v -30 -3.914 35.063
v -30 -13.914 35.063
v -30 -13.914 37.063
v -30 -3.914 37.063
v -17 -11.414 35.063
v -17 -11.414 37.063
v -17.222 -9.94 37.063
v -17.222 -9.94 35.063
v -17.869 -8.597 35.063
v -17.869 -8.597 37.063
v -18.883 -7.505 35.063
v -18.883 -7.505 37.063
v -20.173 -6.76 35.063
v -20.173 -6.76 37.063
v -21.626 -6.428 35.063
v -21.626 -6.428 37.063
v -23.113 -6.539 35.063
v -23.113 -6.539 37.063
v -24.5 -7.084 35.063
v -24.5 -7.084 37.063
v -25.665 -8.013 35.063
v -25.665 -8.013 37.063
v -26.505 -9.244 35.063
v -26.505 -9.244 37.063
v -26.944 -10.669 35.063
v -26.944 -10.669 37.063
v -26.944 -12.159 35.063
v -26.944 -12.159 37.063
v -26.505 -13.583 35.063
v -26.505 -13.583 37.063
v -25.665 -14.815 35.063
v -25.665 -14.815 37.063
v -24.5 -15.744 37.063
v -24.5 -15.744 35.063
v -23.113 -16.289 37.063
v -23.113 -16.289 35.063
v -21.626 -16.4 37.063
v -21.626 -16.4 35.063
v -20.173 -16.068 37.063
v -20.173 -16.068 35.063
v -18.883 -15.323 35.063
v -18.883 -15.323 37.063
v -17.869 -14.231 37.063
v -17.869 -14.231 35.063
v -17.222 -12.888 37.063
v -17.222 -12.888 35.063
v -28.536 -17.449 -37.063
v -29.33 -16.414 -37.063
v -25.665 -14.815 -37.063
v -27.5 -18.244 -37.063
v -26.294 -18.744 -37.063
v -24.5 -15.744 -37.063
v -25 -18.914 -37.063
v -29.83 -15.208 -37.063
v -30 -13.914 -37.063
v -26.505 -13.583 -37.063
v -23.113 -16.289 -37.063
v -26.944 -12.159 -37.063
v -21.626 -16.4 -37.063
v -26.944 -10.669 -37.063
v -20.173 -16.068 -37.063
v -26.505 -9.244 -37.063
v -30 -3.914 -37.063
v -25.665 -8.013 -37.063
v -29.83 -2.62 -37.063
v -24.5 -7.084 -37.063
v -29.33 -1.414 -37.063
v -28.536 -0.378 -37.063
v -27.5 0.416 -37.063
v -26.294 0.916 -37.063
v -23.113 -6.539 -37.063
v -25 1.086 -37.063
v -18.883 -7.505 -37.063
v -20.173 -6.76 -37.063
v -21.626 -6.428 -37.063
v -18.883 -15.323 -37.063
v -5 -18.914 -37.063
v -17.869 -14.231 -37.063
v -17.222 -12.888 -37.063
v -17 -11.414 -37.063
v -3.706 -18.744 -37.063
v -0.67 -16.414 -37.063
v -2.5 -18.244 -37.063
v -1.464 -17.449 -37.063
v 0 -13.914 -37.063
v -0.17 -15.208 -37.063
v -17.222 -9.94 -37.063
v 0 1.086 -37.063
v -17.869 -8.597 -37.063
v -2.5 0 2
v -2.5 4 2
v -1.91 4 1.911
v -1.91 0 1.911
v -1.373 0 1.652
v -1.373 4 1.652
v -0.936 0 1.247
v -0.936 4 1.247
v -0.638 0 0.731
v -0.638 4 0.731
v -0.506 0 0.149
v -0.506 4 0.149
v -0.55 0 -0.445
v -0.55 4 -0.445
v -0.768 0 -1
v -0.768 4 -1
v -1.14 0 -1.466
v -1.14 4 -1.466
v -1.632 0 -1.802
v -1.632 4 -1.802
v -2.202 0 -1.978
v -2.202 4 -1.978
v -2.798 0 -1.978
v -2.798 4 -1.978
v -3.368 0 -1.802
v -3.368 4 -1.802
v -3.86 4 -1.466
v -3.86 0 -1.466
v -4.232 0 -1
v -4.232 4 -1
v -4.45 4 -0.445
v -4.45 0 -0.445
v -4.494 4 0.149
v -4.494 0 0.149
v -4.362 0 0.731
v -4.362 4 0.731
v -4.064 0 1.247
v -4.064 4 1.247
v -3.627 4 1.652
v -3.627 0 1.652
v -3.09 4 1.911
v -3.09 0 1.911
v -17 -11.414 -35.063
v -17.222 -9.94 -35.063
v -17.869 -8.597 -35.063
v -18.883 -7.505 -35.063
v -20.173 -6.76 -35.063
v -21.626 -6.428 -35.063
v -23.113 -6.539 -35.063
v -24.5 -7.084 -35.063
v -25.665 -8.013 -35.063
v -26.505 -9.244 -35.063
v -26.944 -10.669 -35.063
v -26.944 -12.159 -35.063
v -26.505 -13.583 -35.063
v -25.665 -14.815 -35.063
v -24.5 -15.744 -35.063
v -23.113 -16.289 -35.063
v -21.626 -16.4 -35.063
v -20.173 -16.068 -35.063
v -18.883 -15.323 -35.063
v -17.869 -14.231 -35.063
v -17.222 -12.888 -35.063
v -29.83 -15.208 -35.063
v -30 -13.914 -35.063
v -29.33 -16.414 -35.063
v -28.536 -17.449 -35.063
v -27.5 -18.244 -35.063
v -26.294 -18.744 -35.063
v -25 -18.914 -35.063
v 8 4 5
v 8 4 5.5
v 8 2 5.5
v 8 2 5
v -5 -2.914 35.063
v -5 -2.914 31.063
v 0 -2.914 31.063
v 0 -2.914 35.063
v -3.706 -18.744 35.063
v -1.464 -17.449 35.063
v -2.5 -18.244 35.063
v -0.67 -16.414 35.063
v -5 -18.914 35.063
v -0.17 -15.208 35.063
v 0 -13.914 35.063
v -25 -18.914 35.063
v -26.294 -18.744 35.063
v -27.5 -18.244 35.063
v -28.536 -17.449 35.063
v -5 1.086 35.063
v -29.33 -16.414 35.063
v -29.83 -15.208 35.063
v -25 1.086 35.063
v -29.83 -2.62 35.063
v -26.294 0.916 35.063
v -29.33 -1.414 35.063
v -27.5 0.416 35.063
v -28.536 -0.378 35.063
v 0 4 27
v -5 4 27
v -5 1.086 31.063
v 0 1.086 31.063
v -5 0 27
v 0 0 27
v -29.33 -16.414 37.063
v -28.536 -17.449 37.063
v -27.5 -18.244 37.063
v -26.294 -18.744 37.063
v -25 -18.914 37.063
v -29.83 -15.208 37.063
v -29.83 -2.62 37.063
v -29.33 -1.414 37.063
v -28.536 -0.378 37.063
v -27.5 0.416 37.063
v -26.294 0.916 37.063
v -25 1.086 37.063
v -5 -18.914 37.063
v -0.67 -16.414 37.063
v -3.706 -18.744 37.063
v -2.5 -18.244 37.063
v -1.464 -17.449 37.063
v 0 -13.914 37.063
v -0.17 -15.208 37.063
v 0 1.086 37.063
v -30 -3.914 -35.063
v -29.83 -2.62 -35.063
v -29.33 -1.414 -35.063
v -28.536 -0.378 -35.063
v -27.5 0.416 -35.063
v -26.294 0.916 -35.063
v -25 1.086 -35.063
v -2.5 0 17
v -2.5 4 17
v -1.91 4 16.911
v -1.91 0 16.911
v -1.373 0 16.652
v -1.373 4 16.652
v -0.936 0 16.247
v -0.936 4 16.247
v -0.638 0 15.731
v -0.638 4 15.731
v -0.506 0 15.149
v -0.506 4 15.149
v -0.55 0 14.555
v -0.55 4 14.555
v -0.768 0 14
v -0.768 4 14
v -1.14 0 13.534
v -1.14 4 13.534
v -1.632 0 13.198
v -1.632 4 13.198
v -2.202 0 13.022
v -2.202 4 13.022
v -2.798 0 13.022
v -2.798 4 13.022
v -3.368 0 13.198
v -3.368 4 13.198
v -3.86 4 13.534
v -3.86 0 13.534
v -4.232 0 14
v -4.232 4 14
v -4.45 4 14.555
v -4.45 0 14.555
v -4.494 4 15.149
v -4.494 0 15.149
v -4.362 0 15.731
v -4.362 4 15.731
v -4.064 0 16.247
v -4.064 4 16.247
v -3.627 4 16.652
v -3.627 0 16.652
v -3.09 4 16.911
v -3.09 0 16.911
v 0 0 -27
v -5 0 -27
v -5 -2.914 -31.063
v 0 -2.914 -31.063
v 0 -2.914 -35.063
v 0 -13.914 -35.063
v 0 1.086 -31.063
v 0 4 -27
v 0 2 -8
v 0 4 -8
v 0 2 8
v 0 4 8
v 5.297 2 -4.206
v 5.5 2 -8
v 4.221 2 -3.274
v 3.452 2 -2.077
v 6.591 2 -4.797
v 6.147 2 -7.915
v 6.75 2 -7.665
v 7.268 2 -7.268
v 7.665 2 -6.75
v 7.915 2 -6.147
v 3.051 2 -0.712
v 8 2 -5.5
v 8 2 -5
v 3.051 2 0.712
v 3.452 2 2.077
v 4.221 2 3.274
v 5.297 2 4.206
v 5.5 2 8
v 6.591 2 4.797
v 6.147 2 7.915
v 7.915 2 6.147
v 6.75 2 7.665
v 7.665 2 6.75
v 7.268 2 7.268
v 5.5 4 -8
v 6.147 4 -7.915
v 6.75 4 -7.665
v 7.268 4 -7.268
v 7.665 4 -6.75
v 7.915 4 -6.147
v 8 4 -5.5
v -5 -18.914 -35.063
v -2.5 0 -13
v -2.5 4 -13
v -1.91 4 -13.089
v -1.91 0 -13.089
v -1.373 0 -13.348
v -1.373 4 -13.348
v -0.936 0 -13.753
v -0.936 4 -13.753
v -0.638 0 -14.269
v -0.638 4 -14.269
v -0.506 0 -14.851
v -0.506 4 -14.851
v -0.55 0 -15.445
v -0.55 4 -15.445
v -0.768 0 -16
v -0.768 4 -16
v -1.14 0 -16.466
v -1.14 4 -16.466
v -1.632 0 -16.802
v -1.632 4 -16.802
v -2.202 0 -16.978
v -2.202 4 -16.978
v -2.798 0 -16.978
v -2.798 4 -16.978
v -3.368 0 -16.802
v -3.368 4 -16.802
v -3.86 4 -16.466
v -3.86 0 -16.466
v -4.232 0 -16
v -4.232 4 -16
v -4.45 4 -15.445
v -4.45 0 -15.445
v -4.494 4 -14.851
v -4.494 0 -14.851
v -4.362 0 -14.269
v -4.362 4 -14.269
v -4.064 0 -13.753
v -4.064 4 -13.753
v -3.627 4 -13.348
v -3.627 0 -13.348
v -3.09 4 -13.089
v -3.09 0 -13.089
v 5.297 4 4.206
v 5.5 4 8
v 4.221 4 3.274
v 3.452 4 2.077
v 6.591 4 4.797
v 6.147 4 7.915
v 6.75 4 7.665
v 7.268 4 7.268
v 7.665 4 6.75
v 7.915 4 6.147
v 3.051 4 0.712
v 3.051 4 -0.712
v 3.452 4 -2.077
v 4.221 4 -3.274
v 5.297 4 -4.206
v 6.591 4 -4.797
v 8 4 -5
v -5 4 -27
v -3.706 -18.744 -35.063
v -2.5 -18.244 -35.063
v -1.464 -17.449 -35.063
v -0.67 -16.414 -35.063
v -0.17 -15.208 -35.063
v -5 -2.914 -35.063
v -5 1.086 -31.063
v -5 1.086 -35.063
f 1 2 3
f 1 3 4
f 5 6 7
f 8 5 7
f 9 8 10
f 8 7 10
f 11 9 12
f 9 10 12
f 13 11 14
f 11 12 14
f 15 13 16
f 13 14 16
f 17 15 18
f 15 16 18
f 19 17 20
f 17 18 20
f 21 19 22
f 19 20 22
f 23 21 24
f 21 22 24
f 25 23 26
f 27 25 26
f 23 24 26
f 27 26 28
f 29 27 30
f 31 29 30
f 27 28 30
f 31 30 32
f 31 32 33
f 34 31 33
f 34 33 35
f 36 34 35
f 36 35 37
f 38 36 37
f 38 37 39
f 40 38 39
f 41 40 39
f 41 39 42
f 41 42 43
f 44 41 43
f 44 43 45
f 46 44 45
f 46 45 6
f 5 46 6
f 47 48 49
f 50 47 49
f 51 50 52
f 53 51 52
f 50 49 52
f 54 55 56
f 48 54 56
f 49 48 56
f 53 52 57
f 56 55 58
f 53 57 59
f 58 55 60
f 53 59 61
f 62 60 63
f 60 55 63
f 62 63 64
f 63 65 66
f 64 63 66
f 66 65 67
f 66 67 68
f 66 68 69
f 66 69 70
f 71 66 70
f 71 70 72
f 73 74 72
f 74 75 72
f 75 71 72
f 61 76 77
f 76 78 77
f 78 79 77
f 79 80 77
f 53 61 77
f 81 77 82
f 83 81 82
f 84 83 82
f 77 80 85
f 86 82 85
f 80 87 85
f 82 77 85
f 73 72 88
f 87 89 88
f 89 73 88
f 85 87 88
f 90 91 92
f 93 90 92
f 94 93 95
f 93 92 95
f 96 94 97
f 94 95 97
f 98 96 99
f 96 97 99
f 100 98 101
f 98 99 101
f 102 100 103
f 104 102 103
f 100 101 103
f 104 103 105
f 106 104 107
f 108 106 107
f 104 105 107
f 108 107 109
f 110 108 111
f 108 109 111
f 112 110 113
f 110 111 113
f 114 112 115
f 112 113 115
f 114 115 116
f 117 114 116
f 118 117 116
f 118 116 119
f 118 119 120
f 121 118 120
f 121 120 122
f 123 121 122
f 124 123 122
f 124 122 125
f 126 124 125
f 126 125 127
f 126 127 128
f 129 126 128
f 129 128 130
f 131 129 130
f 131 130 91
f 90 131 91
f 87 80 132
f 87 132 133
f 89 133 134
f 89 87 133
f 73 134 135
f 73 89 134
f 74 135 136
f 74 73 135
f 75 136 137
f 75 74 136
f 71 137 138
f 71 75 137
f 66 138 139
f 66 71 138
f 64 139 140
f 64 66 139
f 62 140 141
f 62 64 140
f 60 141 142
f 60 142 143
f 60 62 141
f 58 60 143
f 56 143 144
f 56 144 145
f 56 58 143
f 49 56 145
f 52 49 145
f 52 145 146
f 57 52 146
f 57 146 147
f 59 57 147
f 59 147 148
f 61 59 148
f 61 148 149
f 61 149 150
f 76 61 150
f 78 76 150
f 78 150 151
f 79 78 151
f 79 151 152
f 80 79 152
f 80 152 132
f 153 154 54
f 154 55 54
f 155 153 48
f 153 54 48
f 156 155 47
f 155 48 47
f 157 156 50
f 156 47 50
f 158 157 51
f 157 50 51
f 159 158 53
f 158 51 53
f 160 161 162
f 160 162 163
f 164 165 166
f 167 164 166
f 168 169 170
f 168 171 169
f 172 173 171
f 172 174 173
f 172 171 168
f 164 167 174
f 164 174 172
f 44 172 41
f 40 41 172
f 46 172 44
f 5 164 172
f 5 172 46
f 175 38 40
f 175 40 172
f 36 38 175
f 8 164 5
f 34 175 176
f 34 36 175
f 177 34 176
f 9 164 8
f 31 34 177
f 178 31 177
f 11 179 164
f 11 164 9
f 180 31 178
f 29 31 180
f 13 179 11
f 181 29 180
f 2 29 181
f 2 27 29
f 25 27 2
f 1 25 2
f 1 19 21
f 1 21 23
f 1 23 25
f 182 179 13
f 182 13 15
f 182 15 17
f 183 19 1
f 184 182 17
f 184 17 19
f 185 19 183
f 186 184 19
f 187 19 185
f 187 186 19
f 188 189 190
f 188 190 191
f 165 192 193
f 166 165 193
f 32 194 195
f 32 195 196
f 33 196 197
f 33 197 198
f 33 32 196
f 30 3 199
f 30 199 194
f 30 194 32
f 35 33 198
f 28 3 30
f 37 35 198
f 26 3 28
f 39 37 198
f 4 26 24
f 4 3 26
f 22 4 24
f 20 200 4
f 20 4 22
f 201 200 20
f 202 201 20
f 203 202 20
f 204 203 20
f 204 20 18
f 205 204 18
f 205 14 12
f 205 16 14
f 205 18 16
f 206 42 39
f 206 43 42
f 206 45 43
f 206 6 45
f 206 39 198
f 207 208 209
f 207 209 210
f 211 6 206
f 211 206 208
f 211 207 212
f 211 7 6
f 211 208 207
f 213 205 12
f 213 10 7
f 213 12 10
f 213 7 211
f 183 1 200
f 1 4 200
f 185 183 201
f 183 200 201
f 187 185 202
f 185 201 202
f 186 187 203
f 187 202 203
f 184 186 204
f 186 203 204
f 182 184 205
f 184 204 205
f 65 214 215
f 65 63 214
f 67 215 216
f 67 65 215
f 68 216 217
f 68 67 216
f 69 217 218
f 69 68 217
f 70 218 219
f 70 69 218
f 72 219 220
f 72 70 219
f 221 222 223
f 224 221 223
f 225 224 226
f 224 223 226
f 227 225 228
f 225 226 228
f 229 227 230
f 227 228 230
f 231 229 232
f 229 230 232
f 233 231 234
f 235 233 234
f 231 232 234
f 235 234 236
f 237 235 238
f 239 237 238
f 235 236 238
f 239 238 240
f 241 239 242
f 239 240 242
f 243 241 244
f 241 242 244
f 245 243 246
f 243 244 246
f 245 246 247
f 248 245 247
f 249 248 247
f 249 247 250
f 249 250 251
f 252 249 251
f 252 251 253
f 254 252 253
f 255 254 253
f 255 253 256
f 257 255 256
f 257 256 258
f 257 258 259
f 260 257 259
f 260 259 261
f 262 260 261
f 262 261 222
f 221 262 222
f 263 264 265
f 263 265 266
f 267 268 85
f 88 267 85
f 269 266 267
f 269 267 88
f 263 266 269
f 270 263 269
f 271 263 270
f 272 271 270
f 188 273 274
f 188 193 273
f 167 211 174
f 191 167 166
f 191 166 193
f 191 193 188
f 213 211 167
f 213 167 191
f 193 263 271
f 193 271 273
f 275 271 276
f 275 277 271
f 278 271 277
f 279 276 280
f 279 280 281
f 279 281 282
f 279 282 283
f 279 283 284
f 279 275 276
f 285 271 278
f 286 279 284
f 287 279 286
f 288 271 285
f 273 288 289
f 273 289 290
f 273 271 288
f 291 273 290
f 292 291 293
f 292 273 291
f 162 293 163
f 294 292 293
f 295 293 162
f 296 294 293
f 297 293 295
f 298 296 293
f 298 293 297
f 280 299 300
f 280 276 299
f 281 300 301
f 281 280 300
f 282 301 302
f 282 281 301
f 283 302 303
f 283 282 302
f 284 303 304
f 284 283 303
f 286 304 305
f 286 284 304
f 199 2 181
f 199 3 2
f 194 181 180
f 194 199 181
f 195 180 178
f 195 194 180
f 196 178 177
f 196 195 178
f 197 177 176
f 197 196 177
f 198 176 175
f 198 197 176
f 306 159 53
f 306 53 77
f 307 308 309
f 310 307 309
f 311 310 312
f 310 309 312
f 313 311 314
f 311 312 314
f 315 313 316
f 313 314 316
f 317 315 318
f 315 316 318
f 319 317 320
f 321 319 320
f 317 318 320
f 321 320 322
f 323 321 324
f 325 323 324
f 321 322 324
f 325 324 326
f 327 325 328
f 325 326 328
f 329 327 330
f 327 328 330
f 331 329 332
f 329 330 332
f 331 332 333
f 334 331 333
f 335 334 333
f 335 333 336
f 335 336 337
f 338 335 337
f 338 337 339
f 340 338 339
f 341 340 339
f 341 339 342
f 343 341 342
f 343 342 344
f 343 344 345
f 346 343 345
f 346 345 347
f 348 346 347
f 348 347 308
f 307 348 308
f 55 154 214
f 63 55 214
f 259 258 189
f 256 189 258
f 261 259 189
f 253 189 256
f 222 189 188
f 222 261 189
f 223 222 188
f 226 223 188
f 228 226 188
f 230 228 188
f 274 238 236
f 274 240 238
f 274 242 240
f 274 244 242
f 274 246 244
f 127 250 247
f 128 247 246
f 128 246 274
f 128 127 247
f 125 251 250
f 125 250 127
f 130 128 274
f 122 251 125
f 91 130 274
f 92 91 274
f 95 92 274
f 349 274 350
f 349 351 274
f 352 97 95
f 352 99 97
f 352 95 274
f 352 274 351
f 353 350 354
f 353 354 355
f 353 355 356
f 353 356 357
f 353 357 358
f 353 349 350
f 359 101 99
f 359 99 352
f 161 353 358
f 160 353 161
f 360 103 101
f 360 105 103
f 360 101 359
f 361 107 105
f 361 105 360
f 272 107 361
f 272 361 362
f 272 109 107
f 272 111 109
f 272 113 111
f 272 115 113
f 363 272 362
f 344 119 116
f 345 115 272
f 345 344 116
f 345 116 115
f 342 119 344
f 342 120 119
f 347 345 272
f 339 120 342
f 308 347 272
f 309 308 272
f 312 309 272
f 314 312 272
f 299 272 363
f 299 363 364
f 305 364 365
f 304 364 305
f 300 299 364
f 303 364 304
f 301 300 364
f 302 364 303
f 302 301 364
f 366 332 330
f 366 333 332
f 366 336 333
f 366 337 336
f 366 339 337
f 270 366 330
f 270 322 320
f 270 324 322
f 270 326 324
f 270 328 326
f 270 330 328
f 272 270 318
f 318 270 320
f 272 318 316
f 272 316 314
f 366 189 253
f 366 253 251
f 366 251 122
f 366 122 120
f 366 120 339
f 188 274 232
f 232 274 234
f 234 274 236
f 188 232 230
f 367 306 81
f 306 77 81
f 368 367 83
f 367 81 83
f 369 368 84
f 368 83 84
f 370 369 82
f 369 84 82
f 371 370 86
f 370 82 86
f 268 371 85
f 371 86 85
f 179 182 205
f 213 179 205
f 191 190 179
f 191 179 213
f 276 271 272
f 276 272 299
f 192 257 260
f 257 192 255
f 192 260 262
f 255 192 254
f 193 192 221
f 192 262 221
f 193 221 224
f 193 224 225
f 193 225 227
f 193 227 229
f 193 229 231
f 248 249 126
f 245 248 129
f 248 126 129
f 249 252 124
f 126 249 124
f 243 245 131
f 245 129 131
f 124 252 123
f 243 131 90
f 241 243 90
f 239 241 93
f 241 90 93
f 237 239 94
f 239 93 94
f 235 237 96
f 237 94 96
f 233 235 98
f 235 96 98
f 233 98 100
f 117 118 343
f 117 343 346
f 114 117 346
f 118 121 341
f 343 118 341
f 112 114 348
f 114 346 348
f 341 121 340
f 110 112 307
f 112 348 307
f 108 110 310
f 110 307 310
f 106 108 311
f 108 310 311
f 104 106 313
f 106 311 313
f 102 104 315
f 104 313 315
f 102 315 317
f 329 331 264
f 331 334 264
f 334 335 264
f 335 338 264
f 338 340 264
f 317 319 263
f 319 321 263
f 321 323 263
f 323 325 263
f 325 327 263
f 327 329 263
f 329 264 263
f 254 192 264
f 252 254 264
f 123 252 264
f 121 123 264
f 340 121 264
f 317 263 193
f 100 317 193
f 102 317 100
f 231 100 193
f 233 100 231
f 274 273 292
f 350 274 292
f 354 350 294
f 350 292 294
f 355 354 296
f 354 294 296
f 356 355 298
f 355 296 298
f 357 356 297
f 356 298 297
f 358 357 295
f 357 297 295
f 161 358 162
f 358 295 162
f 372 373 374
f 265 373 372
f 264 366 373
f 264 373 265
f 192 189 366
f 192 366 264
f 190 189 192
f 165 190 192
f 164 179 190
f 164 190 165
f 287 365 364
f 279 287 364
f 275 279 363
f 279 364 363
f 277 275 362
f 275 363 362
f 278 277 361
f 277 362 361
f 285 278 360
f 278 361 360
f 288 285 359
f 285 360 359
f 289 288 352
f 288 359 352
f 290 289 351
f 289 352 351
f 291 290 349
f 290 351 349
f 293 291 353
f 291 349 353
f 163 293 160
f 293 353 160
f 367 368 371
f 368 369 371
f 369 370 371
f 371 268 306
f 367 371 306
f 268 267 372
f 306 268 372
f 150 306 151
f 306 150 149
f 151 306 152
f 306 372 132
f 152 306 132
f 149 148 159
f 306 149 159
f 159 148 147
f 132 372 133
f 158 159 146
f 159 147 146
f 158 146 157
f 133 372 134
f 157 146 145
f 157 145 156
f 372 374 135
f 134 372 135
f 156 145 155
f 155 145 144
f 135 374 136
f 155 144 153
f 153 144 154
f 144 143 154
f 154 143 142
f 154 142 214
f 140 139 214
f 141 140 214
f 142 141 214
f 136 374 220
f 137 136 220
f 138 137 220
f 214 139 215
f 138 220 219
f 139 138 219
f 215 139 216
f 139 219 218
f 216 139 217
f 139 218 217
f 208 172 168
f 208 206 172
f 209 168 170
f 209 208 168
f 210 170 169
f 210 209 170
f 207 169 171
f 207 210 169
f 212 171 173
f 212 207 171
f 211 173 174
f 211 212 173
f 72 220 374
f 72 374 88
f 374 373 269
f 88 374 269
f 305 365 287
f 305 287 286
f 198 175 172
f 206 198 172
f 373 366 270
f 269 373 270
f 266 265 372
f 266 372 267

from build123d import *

# Parameters (mm, degrees)
SKETCH1_W            = 5
SKETCH1_H            = 54
BOSS_EXTRUDE1_DEPTH  = 4
SKETCH3_W            = 16
SKETCH3_H            = 16
BOSS_EXTRUDE2_DEPTH  = 4
SKETCH6_W            = 5
SKETCH6_H            = 4
BOSS_EXTRUDE5_DEPTH  = 5
SKETCH10_W           = 30
SKETCH10_H           = 20
BOSS_EXTRUDE9_DEPTH  = 6
CUT_EXTRUDE2_REACH   = 54.903
SKETCH7_R            = 2
CUT_EXTRUDE3_REACH   = 54.903
SKETCH4_R            = 5
SKETCH12_W           = 16
SKETCH12_H           = 16
CUT_EXTRUDE4_DEPTH   = 2
CUT_EXTRUDE5_DEPTH   = 4
CUT_EXTRUDE6_REACH   = 78.804
SKETCH14_R           = 5
FILLET1_R            = 5
FILLET1_OF_MIRROR2_R = 5
CUT_EXTRUDE7_REACH   = 54.903
FILLET2_R            = 2.5


with BuildPart() as part:
    # Sketch1 → Boss-Extrude1 (new body)
    with BuildSketch(Plane(origin=(0, 0, 0), x_dir=(1, 0, 0), z_dir=(0, 1, 0))):
        with Locations((-2.5, 0)):
            Rectangle(SKETCH1_W, SKETCH1_H)
    extrude(amount=BOSS_EXTRUDE1_DEPTH)

    # Sketch3 → Boss-Extrude2 (add)
    with BuildSketch(Plane(origin=(0, 0, 0), x_dir=(1, 0, 0), z_dir=(0, 1, 0))):
        with Locations((8, 0)):
            Rectangle(SKETCH3_W, SKETCH3_H)
    extrude(amount=BOSS_EXTRUDE2_DEPTH)

    # Sketch6 → Boss-Extrude5 (add, along a direction that is not the sketch's normal)
    with BuildSketch(Plane.XY.offset(27)):
        with Locations((-2.5, 2)):
            Rectangle(SKETCH6_W, SKETCH6_H)
    boss_extrude5 = extrude(amount=BOSS_EXTRUDE5_DEPTH, dir=(0, -0.5827823156195225, 0.8126283114691164))

    # Mirror1: Boss-Extrude5 across plane
    add(boss_extrude5.mirror(Plane.XY))

    # Sketch10 → Boss-Extrude9 (add)
    with BuildSketch(Plane.XY.offset(31.063141557)):
        with Locations((-15, -8.913911578)):
            Rectangle(SKETCH10_W, SKETCH10_H)
    boss_extrude9 = extrude(amount=BOSS_EXTRUDE9_DEPTH)

    # Sketch7 → Cut-Extrude2 (cut, up to next)
    with BuildSketch(Plane(origin=(0, 4, 0), x_dir=(1, 0, 0), z_dir=(0, 1, 0)), mode=Mode.PRIVATE) as cut_extrude2_sk1:
        with Locations(Location((-2.5, 0, 0), (0, 0, 270))):
            Circle(SKETCH7_R)
    cut_extrude2_tool1 = extrude(cut_extrude2_sk1.sketch, amount=-CUT_EXTRUDE2_REACH, mode=Mode.PRIVATE) & part.part
    # Sketch7 → Cut-Extrude2 (cut, up to next)
    with BuildSketch(Plane(origin=(0, 4, 0), x_dir=(1, 0, 0), z_dir=(0, 1, 0)), mode=Mode.PRIVATE) as cut_extrude2_sk2:
        with Locations(Location((-2.5, 15, 0), (0, 0, 270))):
            Circle(SKETCH7_R)
    cut_extrude2_tool2 = extrude(cut_extrude2_sk2.sketch, amount=-CUT_EXTRUDE2_REACH, mode=Mode.PRIVATE) & part.part
    # Sketch7 → Cut-Extrude2 (cut, up to next)
    with BuildSketch(Plane(origin=(0, 4, 0), x_dir=(1, 0, 0), z_dir=(0, 1, 0)), mode=Mode.PRIVATE) as cut_extrude2_sk3:
        with Locations(Location((-2.5, -15, 0), (0, 0, 270))):
            Circle(SKETCH7_R)
    cut_extrude2_tool3 = extrude(cut_extrude2_sk3.sketch, amount=-CUT_EXTRUDE2_REACH, mode=Mode.PRIVATE) & part.part
    add(cut_extrude2_tool1.solids().sort_by_distance((-2.5, 4, 0))[0], mode=Mode.SUBTRACT)
    add(cut_extrude2_tool2.solids().sort_by_distance((-2.5, 4, -15))[0], mode=Mode.SUBTRACT)
    add(cut_extrude2_tool3.solids().sort_by_distance((-2.5, 4, 15))[0], mode=Mode.SUBTRACT)

    # Sketch4 → Cut-Extrude3 (cut, up to next)
    with BuildSketch(Plane(origin=(0, 4, 0), x_dir=(1, 0, 0), z_dir=(0, 1, 0)), mode=Mode.PRIVATE) as cut_extrude3_sk1:
        with Locations(Location((8, 0, 0), (0, 0, 270))):
            Circle(SKETCH4_R)
    cut_extrude3_tool1 = extrude(cut_extrude3_sk1.sketch, amount=-CUT_EXTRUDE3_REACH, mode=Mode.PRIVATE) & part.part
    add(cut_extrude3_tool1.solids().sort_by_distance((8, 4, 0))[0], mode=Mode.SUBTRACT)

    # Sketch12 → Cut-Extrude4 (cut)
    with BuildSketch(Plane.XZ):
        with Locations((8, 0)):
            Rectangle(SKETCH12_W, SKETCH12_H)
    extrude(amount=-CUT_EXTRUDE4_DEPTH, mode=Mode.SUBTRACT)

    # Sketch13 → Cut-Extrude5 (cut)
    with BuildSketch(Plane(origin=(0, 0, 31.063141557), x_dir=(-1, 0, 0), z_dir=(0, 0, -1))):
        Polygon((30, 1.086088422), (5, 1.086088422), (5, -2.913911578), (0, -2.913911578), (0, -18.913911578), (30, -18.913911578), align=None)
    cut_extrude5 = extrude(amount=-CUT_EXTRUDE5_DEPTH, mode=Mode.SUBTRACT)

    # Sketch14 → Cut-Extrude6 (cut, up to next)
    with BuildSketch(Plane.XY.offset(37.063141557), mode=Mode.PRIVATE) as cut_extrude6_sk1:
        with Locations((-22, -11.413911578)):
            Circle(SKETCH14_R)
    cut_extrude6_tool1 = extrude(cut_extrude6_sk1.sketch, amount=-CUT_EXTRUDE6_REACH, mode=Mode.PRIVATE) & part.part
    cut_extrude6 = cut_extrude6_tool1.solids().sort_by_distance((-22, -11.413912, 37.063142))[0]
    add(cut_extrude6, mode=Mode.SUBTRACT)

    # Fillet1
    fillet1_edges = [part.edges().sort_by_distance(p)[0] for p in [
        (0, -18.913911578, 36.063141557),
        (-30, 1.086088422, 36.063141557),
        (-30, -18.913911578, 36.063141557),
    ]]
    fillet(fillet1_edges, radius=FILLET1_R)

    # Mirror2: Boss-Extrude9, Cut-Extrude5, Cut-Extrude6 across plane
    add(boss_extrude9.mirror(Plane.XY))
    add(cut_extrude5.mirror(Plane.XY), mode=Mode.SUBTRACT)
    add(cut_extrude6.mirror(Plane.XY), mode=Mode.SUBTRACT)

    # Fillet1 of Mirror2
    fillet1_of_mirror2_edges = [part.edges().sort_by_distance(p)[0] for p in [
        (0, -18.913911578, -36.063141557),
        (-30, 1.086088422, -36.063141557),
        (-30, -18.913911578, -36.063141557),
    ]]
    fillet(fillet1_of_mirror2_edges, radius=FILLET1_OF_MIRROR2_R)

    # Sketch15 → Cut-Extrude7 (cut, up to next)
    with BuildSketch(Plane(origin=(0, 4, 0), x_dir=(1, 0, 0), z_dir=(0, 1, 0)), mode=Mode.PRIVATE) as cut_extrude7_sk1:
        with BuildLine():
            Line((8, 5), (8, 8))
            Line((8, 8), (16, 8))
            Line((16, 8), (16, -8))
            Line((16, -8), (8, -8))
            Line((8, -8), (8, -5))
            ThreePointArc((8, -5), (13, 0), (8, 5))
        make_face()
    cut_extrude7_tool1 = extrude(cut_extrude7_sk1.sketch, amount=-CUT_EXTRUDE7_REACH, mode=Mode.PRIVATE) & part.part
    add(cut_extrude7_tool1.solids().sort_by_distance((8.178885, 4, -6.5))[0], mode=Mode.SUBTRACT)

    # Fillet2
    fillet2_edges = [part.edges().sort_by_distance(p)[0] for p in [
        (8, 3, 8),
        (8, 3, -8),
    ]]
    fillet(fillet2_edges, radius=FILLET2_R)


solid = part.part
